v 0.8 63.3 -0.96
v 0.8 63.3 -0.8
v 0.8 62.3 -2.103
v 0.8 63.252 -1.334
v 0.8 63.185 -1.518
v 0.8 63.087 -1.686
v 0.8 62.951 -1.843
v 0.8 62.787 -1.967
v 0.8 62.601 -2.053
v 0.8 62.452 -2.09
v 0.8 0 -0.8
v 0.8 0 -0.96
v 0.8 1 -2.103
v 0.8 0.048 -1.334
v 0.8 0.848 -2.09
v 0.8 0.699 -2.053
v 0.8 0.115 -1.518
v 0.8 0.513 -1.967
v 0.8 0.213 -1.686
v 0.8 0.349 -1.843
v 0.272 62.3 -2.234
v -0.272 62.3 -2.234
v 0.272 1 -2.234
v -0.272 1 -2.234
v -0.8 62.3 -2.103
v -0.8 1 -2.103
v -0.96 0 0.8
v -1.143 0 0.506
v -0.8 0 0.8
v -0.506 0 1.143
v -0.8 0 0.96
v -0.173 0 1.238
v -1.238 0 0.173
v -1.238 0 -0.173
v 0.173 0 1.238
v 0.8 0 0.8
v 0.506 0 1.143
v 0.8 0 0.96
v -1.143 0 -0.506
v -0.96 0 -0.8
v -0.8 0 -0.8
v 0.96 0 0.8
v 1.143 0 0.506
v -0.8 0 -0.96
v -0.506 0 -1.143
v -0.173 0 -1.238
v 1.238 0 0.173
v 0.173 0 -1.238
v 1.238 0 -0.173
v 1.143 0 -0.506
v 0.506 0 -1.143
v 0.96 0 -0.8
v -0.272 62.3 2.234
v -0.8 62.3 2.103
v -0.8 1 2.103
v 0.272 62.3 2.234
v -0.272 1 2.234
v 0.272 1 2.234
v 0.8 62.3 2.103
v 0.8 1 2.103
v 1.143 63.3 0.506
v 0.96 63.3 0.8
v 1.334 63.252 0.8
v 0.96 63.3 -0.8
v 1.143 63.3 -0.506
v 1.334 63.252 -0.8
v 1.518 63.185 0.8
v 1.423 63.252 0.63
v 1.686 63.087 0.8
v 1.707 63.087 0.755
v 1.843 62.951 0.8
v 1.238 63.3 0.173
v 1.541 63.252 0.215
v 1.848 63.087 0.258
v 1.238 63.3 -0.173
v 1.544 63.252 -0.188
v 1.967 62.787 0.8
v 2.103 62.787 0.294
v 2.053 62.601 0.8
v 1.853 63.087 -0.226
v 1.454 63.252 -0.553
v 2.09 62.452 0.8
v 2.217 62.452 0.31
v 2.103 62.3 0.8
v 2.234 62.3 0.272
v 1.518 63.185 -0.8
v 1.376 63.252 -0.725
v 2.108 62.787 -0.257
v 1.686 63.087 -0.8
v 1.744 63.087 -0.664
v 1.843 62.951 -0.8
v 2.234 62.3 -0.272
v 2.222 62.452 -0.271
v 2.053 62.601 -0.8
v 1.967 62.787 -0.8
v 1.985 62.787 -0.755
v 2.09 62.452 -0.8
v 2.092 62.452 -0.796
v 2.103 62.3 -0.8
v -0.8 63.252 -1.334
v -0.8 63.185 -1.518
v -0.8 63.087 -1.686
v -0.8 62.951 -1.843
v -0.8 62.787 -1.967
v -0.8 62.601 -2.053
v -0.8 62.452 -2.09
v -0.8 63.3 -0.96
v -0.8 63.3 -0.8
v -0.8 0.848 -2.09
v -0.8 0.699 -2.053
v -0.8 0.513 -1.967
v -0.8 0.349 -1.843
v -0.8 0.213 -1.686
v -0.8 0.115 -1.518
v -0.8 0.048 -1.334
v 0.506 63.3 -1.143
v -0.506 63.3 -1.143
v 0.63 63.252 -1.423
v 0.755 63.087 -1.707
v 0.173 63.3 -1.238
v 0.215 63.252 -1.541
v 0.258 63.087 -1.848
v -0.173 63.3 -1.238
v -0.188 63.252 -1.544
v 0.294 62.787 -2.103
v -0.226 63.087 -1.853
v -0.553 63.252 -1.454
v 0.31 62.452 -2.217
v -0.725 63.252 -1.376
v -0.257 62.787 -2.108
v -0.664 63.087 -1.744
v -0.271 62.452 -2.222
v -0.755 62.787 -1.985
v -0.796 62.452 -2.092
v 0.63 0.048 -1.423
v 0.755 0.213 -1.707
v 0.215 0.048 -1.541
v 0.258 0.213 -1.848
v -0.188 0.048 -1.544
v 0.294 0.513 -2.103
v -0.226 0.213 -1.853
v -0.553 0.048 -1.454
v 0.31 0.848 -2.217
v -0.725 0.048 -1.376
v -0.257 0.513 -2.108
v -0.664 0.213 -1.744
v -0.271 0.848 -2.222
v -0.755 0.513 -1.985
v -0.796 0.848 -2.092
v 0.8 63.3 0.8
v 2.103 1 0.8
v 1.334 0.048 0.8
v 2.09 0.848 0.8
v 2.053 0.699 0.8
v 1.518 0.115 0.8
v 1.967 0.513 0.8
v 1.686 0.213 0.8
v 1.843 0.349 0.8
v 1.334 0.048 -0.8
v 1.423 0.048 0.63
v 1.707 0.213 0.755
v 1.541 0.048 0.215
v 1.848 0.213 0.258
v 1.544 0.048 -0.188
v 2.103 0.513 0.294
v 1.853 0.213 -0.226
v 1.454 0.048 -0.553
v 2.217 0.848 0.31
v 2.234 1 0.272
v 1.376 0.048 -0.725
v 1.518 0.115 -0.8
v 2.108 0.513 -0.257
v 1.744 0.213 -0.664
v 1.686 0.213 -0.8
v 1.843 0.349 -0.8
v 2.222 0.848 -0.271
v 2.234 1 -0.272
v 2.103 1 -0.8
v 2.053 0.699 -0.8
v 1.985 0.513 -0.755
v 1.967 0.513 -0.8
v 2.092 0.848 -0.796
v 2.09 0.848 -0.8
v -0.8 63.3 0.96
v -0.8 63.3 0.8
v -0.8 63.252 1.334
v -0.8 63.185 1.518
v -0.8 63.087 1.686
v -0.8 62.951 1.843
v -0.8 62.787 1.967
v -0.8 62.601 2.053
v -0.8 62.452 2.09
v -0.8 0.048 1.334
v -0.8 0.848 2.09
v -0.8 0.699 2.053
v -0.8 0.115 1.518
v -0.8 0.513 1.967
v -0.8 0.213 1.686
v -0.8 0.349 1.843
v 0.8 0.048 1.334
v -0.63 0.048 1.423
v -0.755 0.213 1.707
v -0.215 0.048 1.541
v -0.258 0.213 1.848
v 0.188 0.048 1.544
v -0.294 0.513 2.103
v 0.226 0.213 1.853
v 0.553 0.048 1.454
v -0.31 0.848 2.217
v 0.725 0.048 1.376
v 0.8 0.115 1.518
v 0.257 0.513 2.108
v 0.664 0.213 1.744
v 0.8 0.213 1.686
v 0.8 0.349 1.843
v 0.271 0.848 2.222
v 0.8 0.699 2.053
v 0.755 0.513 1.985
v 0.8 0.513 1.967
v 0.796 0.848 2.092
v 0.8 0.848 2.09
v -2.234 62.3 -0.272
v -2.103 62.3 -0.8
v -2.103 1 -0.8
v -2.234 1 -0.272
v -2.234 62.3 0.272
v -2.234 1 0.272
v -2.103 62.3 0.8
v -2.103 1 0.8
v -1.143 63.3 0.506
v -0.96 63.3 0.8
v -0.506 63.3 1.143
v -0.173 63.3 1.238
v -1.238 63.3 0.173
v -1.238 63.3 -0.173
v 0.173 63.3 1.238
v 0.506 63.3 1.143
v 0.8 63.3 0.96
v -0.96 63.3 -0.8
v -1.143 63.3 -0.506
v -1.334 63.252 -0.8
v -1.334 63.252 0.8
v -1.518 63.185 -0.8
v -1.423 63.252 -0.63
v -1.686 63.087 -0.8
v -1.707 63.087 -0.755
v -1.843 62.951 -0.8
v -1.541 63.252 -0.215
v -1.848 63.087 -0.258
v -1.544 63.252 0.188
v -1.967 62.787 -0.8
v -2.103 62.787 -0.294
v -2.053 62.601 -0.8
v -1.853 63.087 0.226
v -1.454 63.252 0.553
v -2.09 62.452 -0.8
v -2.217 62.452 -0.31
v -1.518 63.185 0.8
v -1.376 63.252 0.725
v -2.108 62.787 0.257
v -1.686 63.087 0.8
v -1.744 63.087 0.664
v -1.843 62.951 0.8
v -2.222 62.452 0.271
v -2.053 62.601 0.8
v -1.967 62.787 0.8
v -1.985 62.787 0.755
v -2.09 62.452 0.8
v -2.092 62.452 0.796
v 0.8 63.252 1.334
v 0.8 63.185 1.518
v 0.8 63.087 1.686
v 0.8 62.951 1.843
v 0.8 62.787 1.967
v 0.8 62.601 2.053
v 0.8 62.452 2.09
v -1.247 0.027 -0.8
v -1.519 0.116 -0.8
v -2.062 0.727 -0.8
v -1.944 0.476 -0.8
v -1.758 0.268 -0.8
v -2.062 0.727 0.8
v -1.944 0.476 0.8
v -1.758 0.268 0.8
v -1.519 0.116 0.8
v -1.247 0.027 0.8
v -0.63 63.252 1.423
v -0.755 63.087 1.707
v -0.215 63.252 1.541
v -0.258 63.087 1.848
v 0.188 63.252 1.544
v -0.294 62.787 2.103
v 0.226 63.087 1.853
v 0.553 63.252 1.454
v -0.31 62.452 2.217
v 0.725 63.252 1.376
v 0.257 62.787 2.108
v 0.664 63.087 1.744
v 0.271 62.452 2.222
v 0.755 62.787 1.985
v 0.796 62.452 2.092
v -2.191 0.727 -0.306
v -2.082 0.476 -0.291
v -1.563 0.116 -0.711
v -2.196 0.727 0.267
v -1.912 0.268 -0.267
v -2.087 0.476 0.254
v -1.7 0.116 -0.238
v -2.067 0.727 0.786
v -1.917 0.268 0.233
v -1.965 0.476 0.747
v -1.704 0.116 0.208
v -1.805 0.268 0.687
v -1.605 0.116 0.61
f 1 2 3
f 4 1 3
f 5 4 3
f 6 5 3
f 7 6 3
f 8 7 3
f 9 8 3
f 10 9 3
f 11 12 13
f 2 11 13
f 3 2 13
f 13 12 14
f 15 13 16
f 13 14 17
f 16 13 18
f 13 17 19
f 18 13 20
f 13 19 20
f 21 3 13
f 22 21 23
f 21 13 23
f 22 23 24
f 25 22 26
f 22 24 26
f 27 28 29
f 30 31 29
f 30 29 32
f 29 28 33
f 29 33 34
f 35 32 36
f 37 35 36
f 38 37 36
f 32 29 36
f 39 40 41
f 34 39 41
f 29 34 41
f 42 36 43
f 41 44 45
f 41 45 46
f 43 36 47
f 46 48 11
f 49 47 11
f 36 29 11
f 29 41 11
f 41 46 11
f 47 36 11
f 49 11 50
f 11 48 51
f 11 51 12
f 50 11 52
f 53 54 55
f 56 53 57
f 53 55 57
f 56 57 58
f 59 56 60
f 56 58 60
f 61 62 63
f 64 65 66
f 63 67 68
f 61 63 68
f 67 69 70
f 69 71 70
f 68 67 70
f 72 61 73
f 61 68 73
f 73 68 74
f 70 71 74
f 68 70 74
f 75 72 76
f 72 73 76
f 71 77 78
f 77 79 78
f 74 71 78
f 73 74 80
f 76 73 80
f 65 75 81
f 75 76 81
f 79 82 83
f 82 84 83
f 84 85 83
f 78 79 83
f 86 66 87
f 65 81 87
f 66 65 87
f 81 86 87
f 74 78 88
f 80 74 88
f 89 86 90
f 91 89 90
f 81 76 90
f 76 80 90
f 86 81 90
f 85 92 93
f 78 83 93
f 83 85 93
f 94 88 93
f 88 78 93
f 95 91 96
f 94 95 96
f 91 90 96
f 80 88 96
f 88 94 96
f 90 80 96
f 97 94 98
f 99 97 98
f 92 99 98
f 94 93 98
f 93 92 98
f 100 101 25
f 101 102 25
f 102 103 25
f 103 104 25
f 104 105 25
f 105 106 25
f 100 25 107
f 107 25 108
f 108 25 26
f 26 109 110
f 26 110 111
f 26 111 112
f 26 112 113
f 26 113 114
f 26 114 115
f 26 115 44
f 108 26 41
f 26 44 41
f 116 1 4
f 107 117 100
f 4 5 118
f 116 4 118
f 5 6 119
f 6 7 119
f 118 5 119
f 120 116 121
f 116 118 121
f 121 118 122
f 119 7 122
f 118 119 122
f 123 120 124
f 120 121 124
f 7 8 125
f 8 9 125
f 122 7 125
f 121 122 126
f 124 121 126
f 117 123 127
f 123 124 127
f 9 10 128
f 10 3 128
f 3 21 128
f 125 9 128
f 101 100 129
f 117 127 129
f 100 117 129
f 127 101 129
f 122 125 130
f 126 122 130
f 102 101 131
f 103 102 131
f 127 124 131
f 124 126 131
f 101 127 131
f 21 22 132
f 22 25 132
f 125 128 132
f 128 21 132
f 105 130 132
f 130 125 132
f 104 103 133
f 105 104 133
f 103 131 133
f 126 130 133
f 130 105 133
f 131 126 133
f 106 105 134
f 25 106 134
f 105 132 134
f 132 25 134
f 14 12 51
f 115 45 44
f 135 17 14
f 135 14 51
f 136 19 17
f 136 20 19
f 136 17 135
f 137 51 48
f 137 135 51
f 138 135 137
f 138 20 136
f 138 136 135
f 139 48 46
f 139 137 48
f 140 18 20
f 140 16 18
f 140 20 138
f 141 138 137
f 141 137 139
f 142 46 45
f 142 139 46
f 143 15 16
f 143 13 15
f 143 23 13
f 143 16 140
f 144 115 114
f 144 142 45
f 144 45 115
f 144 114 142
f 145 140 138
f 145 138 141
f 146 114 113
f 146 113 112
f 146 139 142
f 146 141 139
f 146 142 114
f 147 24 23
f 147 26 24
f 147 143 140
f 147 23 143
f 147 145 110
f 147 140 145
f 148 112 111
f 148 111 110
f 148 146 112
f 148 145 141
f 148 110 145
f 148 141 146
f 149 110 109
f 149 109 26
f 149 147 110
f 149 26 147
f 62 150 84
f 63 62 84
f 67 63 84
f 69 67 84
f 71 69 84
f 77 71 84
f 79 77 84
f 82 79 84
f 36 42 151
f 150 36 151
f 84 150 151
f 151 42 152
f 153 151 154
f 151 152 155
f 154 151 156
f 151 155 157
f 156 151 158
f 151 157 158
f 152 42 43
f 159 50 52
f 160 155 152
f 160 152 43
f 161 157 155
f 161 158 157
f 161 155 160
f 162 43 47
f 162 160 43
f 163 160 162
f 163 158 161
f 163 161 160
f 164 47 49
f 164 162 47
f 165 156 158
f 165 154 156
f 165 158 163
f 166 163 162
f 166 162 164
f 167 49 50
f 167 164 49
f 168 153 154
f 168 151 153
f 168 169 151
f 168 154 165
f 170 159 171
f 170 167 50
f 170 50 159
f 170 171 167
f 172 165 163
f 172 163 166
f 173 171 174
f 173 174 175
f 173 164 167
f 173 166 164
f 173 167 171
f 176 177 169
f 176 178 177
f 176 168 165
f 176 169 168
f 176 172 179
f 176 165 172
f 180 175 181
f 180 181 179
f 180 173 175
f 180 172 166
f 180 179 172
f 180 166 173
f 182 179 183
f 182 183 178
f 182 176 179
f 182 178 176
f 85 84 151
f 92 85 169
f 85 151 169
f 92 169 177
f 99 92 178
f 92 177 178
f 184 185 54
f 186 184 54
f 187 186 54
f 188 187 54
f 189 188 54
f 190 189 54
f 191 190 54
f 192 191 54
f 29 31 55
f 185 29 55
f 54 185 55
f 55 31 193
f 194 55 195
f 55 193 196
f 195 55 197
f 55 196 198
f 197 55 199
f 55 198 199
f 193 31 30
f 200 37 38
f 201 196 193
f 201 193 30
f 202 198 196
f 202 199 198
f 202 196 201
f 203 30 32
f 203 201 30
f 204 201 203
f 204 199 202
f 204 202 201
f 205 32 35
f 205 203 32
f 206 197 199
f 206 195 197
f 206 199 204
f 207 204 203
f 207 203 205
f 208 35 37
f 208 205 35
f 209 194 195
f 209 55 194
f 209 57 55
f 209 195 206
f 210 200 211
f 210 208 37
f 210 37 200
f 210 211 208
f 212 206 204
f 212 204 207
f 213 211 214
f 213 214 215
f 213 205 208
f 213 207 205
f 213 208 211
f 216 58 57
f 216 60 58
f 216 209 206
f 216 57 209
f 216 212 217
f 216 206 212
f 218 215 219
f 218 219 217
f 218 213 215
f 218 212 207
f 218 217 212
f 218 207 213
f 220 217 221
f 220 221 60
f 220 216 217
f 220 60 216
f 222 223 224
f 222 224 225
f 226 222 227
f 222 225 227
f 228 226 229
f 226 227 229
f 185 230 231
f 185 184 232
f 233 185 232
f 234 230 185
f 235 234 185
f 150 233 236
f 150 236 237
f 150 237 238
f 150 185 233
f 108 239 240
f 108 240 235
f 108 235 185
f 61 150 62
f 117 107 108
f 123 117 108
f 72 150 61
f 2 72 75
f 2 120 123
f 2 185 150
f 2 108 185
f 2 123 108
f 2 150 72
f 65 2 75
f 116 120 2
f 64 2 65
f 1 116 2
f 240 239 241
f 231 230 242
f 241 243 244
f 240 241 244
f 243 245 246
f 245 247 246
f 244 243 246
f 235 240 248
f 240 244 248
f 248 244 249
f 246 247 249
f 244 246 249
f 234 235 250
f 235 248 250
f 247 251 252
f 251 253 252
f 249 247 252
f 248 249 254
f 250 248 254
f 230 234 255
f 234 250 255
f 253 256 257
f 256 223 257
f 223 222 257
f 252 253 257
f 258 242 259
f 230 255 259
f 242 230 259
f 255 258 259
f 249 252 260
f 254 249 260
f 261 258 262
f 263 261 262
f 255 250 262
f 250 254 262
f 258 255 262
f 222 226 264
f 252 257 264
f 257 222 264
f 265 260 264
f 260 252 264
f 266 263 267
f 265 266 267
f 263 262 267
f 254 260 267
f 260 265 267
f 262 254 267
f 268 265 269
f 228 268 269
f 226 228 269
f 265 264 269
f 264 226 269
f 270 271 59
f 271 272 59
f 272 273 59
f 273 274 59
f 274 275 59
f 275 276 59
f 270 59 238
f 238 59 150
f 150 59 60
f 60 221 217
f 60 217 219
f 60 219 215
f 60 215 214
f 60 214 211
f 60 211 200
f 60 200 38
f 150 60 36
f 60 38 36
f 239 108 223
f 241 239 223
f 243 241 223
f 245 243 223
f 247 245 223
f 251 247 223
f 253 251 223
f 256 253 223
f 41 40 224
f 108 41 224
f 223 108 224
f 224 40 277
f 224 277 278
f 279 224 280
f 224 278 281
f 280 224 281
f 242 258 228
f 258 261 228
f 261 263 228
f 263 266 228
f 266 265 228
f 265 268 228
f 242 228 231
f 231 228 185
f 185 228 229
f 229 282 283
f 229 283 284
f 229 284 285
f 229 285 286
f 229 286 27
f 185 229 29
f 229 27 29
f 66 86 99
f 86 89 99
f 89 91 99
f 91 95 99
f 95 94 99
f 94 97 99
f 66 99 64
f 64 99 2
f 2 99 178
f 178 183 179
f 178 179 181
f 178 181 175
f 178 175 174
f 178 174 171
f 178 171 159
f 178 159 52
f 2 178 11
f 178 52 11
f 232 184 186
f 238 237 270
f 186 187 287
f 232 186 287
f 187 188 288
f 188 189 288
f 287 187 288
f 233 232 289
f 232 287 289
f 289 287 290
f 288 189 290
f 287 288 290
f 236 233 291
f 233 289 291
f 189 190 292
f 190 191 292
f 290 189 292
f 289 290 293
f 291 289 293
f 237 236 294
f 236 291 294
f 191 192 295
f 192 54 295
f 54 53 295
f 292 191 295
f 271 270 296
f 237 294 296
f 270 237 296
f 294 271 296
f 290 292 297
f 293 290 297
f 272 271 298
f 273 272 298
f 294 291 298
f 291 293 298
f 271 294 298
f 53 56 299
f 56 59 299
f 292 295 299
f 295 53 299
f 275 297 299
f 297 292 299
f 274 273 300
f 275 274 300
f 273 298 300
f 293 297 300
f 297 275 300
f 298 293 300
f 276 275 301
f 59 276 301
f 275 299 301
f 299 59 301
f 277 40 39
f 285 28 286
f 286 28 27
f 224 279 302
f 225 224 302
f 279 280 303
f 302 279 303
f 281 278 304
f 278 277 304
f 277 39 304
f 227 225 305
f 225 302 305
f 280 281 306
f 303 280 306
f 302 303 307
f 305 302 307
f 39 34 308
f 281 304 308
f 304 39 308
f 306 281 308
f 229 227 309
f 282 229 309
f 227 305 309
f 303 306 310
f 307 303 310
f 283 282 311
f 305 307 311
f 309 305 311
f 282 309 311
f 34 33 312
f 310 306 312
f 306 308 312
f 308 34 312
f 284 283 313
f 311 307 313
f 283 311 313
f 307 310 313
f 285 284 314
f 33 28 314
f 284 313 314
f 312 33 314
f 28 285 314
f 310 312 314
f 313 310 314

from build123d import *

# Parameters (mm, degrees)
BOSS_EXTRUDE1_DEPTH = 63.3
FILLET1_R           = 1
FILLET2_R           = 1
FILLET3_R           = 1
FILLET4_R           = 1
FILLET20_R          = 1
FILLET21_R          = 1
FILLET22_R          = 1
FILLET23_R          = 1


with BuildPart() as part:
    # Sketch1 → Boss-Extrude1 (new body)
    with BuildSketch(Plane(origin=(0, 0, 0), x_dir=(1, 0, 0), z_dir=(0, 1, 0))):
        with BuildLine():
            Line((-0.8, -0.8), (-0.8, -2.102974084))
            ThreePointArc((-0.8, -2.102974084), (0, -2.25), (0.8, -2.102974084))
            Line((0.8, -2.102974084), (0.8, -0.8))
            Line((0.8, -0.8), (2.102974084, -0.8))
            ThreePointArc((2.102974084, -0.8), (2.25, 0), (2.102974084, 0.8))
            Line((2.102974084, 0.8), (0.8, 0.8))
            Line((0.8, 0.8), (0.8, 2.102974084))
            ThreePointArc((0.8, 2.102974084), (0, 2.25), (-0.8, 2.102974084))
            Line((-0.8, 2.102974084), (-0.8, 0.8))
            Line((-0.8, 0.8), (-2.102974084, 0.8))
            ThreePointArc((-2.102974084, 0.8), (-2.25, 0), (-2.102974084, -0.8))
            Line((-2.102974084, -0.8), (-0.8, -0.8))
        make_face()
    extrude(amount=BOSS_EXTRUDE1_DEPTH)

    # Fillet1
    fillet1_edges = [part.edges().sort_by_distance(p)[0] for p in [
        (-2.25, 0, 0),
    ]]
    fillet(fillet1_edges, radius=FILLET1_R)

    # Fillet2
    fillet2_edges = [part.edges().sort_by_distance(p)[0] for p in [
        (0, 0, 2.25),
    ]]
    fillet(fillet2_edges, radius=FILLET2_R)

    # Fillet3
    fillet3_edges = [part.edges().sort_by_distance(p)[0] for p in [
        (2.25, 0, 0),
    ]]
    fillet(fillet3_edges, radius=FILLET3_R)

    # Fillet4
    fillet4_edges = [part.edges().sort_by_distance(p)[0] for p in [
        (0, 0, -2.25),
    ]]
    fillet(fillet4_edges, radius=FILLET4_R)

    # Fillet20
    fillet20_edges = [part.edges().sort_by_distance(p)[0] for p in [
        (2.25, 63.3, 0),
    ]]
    fillet(fillet20_edges, radius=FILLET20_R)

    # Fillet21
    fillet21_edges = [part.edges().sort_by_distance(p)[0] for p in [
        (0, 63.3, 2.25),
    ]]
    fillet(fillet21_edges, radius=FILLET21_R)

    # Fillet22
    fillet22_edges = [part.edges().sort_by_distance(p)[0] for p in [
        (-2.25, 63.3, 0),
    ]]
    fillet(fillet22_edges, radius=FILLET22_R)

    # Fillet23
    fillet23_edges = [part.edges().sort_by_distance(p)[0] for p in [
        (0, 63.3, -2.25),
    ]]
    fillet(fillet23_edges, radius=FILLET23_R)


solid = part.part
